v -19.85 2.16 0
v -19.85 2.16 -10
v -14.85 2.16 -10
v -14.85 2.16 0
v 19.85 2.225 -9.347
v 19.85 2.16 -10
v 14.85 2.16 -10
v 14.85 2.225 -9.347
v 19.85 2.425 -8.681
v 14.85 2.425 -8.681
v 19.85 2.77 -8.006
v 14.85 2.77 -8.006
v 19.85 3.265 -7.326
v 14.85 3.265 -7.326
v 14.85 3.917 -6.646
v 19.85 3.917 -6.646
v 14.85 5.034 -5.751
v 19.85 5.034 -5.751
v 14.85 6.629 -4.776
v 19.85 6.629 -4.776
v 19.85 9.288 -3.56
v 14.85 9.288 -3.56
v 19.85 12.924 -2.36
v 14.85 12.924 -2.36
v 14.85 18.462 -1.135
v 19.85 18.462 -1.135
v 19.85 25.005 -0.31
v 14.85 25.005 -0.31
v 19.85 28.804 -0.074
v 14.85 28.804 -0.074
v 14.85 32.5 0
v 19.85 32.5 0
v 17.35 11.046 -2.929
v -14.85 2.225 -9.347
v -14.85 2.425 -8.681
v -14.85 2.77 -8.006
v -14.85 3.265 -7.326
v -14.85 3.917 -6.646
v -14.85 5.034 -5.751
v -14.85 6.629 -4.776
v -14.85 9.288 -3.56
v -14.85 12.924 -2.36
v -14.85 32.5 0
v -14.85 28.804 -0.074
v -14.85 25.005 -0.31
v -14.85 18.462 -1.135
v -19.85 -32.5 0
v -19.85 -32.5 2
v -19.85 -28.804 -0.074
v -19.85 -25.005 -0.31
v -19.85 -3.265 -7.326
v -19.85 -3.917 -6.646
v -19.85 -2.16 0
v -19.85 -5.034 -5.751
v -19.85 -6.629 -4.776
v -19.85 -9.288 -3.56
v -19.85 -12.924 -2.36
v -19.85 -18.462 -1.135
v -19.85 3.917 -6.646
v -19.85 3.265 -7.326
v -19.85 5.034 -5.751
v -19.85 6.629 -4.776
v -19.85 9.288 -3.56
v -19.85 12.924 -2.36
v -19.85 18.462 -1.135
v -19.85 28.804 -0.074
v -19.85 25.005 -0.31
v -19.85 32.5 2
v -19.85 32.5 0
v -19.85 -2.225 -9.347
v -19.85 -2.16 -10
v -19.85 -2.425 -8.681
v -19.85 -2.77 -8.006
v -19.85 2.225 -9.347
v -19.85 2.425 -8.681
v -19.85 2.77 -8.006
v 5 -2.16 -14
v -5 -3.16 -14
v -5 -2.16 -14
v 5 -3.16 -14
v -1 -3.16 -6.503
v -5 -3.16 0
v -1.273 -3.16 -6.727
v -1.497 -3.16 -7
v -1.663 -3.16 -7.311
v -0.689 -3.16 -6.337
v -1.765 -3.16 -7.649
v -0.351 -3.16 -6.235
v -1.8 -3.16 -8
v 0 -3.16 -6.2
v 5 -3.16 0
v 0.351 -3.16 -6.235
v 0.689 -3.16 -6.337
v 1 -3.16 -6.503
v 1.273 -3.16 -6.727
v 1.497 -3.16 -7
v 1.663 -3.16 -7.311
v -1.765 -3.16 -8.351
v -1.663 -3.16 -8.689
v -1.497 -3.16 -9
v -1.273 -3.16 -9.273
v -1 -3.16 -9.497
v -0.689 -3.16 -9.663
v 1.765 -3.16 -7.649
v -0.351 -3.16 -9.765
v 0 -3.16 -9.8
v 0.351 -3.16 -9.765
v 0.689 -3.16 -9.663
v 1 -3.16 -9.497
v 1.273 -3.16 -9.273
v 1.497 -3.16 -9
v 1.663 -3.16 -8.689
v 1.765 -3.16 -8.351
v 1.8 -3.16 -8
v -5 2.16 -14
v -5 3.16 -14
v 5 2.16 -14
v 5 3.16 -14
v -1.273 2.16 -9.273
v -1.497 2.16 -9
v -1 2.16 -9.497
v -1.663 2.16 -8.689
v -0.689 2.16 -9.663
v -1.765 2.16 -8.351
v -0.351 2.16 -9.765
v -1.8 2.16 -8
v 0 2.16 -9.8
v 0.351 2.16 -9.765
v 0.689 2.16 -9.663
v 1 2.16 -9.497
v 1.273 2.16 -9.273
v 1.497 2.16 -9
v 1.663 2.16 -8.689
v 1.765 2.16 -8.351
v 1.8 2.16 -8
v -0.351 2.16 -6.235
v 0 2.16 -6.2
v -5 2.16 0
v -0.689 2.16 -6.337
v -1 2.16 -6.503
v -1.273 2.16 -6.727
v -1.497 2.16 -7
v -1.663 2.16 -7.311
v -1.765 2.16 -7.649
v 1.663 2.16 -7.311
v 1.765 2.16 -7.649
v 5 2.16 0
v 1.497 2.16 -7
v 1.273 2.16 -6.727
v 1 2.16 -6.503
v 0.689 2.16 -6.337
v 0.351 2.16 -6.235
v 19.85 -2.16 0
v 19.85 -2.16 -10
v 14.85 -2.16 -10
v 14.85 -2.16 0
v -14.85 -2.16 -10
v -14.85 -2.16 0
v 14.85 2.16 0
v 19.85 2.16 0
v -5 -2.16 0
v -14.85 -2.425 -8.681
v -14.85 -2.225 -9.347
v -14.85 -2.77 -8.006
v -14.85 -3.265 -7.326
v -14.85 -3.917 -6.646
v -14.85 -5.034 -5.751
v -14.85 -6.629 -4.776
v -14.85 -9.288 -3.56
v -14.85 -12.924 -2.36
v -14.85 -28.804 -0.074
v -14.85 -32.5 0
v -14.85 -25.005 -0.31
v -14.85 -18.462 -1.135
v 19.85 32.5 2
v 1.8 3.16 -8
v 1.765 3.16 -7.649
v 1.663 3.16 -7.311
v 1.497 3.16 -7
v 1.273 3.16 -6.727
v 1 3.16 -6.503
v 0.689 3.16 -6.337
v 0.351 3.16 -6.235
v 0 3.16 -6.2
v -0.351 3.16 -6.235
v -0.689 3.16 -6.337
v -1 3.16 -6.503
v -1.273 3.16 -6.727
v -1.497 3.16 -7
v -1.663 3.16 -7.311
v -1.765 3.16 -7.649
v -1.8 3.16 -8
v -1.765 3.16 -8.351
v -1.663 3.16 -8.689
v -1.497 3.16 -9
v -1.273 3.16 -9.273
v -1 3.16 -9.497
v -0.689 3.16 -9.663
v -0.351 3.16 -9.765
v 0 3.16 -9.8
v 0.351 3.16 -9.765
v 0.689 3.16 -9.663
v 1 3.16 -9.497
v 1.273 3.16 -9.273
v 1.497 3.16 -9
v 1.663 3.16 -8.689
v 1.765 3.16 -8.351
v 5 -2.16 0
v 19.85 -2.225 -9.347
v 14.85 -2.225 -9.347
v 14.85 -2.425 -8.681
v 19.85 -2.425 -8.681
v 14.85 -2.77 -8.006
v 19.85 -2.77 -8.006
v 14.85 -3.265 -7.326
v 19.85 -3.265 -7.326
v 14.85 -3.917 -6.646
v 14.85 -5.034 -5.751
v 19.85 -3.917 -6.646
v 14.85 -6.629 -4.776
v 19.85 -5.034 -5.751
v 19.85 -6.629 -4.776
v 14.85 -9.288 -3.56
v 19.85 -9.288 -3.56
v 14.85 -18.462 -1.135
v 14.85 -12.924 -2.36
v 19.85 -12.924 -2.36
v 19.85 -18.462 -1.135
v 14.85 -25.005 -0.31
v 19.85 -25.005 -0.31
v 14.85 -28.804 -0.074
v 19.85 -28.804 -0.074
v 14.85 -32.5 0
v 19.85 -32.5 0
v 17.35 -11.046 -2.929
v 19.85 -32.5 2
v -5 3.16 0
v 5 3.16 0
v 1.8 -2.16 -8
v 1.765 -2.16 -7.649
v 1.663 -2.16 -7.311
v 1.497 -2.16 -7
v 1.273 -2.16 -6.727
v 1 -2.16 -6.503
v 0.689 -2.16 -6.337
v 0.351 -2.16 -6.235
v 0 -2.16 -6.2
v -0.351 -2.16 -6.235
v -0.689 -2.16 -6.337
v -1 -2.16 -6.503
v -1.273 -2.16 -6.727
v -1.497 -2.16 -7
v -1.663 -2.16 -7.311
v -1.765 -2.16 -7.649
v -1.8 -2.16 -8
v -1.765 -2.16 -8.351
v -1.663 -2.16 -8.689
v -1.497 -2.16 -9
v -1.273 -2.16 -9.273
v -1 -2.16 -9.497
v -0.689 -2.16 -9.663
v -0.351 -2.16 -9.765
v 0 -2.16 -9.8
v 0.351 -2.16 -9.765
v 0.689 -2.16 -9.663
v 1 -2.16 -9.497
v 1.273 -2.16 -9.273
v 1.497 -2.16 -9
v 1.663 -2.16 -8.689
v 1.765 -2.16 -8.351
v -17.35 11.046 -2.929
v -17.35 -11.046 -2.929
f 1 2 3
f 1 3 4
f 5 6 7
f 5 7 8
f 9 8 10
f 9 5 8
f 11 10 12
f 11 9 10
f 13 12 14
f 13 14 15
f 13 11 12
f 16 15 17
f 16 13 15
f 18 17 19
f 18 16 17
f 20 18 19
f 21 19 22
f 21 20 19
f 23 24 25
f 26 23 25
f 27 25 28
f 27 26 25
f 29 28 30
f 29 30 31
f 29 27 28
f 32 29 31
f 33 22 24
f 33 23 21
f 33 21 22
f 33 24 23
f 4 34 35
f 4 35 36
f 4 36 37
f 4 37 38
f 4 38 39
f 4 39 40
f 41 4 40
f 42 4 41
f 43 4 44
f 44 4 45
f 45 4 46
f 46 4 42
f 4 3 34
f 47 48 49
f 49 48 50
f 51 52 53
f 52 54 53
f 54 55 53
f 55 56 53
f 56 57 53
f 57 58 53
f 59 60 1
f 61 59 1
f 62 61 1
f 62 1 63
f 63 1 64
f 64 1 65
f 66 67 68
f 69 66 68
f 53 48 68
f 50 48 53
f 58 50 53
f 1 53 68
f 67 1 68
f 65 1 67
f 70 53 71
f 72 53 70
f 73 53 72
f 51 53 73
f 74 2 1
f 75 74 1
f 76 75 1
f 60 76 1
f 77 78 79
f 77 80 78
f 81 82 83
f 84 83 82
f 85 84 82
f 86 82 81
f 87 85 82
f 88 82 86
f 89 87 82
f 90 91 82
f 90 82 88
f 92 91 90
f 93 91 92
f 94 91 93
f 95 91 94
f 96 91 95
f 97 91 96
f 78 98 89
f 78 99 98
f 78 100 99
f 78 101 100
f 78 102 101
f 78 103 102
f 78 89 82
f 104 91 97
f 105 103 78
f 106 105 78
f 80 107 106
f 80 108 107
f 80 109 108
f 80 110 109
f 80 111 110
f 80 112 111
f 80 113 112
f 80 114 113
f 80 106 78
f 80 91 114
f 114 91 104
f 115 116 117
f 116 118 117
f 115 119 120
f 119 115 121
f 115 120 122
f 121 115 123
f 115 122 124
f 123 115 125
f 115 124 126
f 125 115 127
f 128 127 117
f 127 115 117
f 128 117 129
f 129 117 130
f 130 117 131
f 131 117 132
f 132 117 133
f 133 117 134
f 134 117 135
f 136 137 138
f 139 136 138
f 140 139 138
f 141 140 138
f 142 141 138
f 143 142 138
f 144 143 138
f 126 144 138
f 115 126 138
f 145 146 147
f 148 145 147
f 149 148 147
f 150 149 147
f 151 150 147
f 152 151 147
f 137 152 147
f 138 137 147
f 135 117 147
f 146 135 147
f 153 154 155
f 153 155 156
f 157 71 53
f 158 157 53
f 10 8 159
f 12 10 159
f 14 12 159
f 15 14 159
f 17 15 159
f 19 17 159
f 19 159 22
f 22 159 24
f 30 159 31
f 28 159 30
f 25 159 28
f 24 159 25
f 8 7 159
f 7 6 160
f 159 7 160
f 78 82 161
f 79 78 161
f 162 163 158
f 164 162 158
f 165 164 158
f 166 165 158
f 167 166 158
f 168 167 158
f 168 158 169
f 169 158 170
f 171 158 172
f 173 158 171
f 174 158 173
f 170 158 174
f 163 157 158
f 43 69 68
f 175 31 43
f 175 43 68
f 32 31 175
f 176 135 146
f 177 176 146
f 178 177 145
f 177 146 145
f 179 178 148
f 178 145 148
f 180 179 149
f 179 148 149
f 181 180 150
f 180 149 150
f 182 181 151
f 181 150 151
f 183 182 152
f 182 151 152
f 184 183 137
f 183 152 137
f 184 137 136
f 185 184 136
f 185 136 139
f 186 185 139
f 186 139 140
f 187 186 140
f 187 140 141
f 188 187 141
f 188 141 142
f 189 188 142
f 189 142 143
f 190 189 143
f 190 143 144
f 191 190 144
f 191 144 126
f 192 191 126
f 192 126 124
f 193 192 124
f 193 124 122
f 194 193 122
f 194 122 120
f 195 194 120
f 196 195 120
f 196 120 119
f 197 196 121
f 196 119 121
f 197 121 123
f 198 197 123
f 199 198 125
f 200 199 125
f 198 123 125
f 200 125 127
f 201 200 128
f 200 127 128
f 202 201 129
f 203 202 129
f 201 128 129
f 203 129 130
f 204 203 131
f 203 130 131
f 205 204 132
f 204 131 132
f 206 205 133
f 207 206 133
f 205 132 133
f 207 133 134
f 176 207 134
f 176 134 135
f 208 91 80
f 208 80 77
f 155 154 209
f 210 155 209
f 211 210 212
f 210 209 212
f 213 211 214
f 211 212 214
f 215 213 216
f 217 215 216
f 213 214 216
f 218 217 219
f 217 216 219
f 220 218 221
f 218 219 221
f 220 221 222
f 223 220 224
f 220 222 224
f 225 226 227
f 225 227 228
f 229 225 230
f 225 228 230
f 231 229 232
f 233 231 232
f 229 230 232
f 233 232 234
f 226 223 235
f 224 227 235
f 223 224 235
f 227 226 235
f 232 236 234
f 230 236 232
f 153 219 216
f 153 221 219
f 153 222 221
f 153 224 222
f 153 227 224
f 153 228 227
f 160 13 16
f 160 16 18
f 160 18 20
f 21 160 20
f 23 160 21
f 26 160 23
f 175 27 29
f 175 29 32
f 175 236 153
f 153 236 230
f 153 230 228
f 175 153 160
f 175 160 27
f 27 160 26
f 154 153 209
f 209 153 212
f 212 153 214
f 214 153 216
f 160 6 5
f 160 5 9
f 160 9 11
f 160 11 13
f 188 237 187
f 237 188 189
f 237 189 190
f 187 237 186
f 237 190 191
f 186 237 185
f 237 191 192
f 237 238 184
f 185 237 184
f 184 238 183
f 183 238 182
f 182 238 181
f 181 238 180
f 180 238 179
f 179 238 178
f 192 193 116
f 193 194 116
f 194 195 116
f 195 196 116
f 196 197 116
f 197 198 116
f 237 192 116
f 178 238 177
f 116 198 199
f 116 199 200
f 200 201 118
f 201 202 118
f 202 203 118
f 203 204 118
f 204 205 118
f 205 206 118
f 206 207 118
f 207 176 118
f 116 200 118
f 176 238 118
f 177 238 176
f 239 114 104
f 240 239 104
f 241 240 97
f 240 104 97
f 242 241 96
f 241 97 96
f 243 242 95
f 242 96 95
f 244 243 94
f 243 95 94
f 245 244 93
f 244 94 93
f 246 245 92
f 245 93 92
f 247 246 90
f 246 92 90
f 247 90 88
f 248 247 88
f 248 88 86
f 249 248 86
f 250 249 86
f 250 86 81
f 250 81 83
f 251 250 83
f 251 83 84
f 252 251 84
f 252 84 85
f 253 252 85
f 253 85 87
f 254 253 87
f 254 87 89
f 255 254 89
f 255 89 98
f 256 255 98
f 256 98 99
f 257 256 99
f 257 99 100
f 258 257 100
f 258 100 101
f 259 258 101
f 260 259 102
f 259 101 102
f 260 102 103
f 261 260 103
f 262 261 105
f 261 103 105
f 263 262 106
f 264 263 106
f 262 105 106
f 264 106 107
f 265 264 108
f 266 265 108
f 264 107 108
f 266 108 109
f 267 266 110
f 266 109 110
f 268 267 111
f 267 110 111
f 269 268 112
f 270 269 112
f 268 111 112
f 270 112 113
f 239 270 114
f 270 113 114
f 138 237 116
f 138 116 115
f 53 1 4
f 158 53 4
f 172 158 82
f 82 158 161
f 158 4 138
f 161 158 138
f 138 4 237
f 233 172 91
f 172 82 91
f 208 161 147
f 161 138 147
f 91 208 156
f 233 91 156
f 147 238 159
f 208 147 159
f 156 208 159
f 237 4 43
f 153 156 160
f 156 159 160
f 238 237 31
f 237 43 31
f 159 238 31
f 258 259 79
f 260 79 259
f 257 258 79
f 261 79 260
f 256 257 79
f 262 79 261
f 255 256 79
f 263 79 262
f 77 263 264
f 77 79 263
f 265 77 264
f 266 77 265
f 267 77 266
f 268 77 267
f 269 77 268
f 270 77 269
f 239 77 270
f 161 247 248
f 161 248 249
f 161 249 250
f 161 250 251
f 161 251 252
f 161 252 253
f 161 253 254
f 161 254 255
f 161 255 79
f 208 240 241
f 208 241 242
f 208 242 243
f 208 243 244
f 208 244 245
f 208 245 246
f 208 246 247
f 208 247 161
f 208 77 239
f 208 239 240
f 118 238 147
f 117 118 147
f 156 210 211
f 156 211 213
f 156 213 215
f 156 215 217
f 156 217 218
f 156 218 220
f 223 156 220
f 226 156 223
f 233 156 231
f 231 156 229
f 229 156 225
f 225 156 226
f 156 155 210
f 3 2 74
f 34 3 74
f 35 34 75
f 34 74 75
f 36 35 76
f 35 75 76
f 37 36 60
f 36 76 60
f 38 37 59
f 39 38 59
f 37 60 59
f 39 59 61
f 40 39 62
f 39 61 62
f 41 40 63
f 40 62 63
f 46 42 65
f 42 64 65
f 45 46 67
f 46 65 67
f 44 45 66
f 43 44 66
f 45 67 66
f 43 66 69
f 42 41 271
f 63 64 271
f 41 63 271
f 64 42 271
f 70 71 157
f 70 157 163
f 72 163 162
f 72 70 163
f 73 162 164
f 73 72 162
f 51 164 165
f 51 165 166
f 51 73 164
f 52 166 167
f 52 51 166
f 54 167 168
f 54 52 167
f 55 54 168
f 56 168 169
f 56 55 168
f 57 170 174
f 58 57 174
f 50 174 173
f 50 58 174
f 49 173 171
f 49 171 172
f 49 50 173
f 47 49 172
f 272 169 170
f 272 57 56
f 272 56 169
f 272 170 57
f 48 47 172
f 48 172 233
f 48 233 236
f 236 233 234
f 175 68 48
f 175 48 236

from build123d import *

# Parameters (mm, degrees)
F0_W             = 39.7
F0_H             = 65
F1_DEPTH         = 2
F3_DEPTH         = 5
F3_COPIES2_COUNT = 2
F5_DEPTH         = 5
F6_R             = 1.8
F7_DEPTH         = 35.6610001


# Not quite as in the source:
# - a pattern or mirror of a feature is missing from the dataset's text; its kind, count and spacing are read off the source's solid


with BuildPart() as f1:
    # F0 (on Top) → F1 (new body)
    with BuildSketch(Plane.XY):
        Rectangle(F0_W, F0_H)
    extrude(amount=F1_DEPTH)

    # F2 (on face) → F3 (join)
    with BuildSketch(Plane.YZ.offset(19.85)):
        with BuildLine():
            add(Edge.make_bspline(
                [(-2.16, -10), (-2.16, 0), (-32.5, 0)],
                knots=[0, 0, 0, 1.5707963268, 1.5707963268, 1.5707963268], degree=2, weights=[1, 0.7071067812, 1]))
            Line((-2.16, -10), (-2.16, 0))
            Line((-2.16, 0), (-32.5, 0))
        make_face()
    f3 = extrude(amount=-F3_DEPTH)

    # F3_copies: F3 across plane
    add(f3.mirror(Plane.ZX))

    # F3_copies1: F3 across plane
    add(f3.mirror(Plane(origin=(0, 0, 0), x_dir=(0, 0, -1), z_dir=(-1, 0, 0))))

    # F3_copies2: F3 ×2 about axis
    f3_copies2_axis = Axis((0, 0, 0), (0, 0, 1))
    for i in range(1, F3_COPIES2_COUNT):
        add(f3.rotate(f3_copies2_axis, i * 360 / F3_COPIES2_COUNT))

    # F4 (on Right) → F5 (join, symmetric)
    with BuildSketch(Plane.YZ):
        Polygon((-2.16, -14), (-2.16, -10), (-2.16, 0), (-3.16, 0), (-3.16, -14), align=None)
    f5 = extrude(amount=F5_DEPTH, both=True)

    # F5_copies: F5 across plane
    add(f5.mirror(Plane.ZX))

    # F6 (on face) → F7 (cut, through all)
    with BuildSketch(Plane.XZ.offset(3.16)):
        with Locations((0, -8)):
            Circle(F6_R)
    extrude(amount=-F7_DEPTH, mode=Mode.SUBTRACT)


solid = f1.part
